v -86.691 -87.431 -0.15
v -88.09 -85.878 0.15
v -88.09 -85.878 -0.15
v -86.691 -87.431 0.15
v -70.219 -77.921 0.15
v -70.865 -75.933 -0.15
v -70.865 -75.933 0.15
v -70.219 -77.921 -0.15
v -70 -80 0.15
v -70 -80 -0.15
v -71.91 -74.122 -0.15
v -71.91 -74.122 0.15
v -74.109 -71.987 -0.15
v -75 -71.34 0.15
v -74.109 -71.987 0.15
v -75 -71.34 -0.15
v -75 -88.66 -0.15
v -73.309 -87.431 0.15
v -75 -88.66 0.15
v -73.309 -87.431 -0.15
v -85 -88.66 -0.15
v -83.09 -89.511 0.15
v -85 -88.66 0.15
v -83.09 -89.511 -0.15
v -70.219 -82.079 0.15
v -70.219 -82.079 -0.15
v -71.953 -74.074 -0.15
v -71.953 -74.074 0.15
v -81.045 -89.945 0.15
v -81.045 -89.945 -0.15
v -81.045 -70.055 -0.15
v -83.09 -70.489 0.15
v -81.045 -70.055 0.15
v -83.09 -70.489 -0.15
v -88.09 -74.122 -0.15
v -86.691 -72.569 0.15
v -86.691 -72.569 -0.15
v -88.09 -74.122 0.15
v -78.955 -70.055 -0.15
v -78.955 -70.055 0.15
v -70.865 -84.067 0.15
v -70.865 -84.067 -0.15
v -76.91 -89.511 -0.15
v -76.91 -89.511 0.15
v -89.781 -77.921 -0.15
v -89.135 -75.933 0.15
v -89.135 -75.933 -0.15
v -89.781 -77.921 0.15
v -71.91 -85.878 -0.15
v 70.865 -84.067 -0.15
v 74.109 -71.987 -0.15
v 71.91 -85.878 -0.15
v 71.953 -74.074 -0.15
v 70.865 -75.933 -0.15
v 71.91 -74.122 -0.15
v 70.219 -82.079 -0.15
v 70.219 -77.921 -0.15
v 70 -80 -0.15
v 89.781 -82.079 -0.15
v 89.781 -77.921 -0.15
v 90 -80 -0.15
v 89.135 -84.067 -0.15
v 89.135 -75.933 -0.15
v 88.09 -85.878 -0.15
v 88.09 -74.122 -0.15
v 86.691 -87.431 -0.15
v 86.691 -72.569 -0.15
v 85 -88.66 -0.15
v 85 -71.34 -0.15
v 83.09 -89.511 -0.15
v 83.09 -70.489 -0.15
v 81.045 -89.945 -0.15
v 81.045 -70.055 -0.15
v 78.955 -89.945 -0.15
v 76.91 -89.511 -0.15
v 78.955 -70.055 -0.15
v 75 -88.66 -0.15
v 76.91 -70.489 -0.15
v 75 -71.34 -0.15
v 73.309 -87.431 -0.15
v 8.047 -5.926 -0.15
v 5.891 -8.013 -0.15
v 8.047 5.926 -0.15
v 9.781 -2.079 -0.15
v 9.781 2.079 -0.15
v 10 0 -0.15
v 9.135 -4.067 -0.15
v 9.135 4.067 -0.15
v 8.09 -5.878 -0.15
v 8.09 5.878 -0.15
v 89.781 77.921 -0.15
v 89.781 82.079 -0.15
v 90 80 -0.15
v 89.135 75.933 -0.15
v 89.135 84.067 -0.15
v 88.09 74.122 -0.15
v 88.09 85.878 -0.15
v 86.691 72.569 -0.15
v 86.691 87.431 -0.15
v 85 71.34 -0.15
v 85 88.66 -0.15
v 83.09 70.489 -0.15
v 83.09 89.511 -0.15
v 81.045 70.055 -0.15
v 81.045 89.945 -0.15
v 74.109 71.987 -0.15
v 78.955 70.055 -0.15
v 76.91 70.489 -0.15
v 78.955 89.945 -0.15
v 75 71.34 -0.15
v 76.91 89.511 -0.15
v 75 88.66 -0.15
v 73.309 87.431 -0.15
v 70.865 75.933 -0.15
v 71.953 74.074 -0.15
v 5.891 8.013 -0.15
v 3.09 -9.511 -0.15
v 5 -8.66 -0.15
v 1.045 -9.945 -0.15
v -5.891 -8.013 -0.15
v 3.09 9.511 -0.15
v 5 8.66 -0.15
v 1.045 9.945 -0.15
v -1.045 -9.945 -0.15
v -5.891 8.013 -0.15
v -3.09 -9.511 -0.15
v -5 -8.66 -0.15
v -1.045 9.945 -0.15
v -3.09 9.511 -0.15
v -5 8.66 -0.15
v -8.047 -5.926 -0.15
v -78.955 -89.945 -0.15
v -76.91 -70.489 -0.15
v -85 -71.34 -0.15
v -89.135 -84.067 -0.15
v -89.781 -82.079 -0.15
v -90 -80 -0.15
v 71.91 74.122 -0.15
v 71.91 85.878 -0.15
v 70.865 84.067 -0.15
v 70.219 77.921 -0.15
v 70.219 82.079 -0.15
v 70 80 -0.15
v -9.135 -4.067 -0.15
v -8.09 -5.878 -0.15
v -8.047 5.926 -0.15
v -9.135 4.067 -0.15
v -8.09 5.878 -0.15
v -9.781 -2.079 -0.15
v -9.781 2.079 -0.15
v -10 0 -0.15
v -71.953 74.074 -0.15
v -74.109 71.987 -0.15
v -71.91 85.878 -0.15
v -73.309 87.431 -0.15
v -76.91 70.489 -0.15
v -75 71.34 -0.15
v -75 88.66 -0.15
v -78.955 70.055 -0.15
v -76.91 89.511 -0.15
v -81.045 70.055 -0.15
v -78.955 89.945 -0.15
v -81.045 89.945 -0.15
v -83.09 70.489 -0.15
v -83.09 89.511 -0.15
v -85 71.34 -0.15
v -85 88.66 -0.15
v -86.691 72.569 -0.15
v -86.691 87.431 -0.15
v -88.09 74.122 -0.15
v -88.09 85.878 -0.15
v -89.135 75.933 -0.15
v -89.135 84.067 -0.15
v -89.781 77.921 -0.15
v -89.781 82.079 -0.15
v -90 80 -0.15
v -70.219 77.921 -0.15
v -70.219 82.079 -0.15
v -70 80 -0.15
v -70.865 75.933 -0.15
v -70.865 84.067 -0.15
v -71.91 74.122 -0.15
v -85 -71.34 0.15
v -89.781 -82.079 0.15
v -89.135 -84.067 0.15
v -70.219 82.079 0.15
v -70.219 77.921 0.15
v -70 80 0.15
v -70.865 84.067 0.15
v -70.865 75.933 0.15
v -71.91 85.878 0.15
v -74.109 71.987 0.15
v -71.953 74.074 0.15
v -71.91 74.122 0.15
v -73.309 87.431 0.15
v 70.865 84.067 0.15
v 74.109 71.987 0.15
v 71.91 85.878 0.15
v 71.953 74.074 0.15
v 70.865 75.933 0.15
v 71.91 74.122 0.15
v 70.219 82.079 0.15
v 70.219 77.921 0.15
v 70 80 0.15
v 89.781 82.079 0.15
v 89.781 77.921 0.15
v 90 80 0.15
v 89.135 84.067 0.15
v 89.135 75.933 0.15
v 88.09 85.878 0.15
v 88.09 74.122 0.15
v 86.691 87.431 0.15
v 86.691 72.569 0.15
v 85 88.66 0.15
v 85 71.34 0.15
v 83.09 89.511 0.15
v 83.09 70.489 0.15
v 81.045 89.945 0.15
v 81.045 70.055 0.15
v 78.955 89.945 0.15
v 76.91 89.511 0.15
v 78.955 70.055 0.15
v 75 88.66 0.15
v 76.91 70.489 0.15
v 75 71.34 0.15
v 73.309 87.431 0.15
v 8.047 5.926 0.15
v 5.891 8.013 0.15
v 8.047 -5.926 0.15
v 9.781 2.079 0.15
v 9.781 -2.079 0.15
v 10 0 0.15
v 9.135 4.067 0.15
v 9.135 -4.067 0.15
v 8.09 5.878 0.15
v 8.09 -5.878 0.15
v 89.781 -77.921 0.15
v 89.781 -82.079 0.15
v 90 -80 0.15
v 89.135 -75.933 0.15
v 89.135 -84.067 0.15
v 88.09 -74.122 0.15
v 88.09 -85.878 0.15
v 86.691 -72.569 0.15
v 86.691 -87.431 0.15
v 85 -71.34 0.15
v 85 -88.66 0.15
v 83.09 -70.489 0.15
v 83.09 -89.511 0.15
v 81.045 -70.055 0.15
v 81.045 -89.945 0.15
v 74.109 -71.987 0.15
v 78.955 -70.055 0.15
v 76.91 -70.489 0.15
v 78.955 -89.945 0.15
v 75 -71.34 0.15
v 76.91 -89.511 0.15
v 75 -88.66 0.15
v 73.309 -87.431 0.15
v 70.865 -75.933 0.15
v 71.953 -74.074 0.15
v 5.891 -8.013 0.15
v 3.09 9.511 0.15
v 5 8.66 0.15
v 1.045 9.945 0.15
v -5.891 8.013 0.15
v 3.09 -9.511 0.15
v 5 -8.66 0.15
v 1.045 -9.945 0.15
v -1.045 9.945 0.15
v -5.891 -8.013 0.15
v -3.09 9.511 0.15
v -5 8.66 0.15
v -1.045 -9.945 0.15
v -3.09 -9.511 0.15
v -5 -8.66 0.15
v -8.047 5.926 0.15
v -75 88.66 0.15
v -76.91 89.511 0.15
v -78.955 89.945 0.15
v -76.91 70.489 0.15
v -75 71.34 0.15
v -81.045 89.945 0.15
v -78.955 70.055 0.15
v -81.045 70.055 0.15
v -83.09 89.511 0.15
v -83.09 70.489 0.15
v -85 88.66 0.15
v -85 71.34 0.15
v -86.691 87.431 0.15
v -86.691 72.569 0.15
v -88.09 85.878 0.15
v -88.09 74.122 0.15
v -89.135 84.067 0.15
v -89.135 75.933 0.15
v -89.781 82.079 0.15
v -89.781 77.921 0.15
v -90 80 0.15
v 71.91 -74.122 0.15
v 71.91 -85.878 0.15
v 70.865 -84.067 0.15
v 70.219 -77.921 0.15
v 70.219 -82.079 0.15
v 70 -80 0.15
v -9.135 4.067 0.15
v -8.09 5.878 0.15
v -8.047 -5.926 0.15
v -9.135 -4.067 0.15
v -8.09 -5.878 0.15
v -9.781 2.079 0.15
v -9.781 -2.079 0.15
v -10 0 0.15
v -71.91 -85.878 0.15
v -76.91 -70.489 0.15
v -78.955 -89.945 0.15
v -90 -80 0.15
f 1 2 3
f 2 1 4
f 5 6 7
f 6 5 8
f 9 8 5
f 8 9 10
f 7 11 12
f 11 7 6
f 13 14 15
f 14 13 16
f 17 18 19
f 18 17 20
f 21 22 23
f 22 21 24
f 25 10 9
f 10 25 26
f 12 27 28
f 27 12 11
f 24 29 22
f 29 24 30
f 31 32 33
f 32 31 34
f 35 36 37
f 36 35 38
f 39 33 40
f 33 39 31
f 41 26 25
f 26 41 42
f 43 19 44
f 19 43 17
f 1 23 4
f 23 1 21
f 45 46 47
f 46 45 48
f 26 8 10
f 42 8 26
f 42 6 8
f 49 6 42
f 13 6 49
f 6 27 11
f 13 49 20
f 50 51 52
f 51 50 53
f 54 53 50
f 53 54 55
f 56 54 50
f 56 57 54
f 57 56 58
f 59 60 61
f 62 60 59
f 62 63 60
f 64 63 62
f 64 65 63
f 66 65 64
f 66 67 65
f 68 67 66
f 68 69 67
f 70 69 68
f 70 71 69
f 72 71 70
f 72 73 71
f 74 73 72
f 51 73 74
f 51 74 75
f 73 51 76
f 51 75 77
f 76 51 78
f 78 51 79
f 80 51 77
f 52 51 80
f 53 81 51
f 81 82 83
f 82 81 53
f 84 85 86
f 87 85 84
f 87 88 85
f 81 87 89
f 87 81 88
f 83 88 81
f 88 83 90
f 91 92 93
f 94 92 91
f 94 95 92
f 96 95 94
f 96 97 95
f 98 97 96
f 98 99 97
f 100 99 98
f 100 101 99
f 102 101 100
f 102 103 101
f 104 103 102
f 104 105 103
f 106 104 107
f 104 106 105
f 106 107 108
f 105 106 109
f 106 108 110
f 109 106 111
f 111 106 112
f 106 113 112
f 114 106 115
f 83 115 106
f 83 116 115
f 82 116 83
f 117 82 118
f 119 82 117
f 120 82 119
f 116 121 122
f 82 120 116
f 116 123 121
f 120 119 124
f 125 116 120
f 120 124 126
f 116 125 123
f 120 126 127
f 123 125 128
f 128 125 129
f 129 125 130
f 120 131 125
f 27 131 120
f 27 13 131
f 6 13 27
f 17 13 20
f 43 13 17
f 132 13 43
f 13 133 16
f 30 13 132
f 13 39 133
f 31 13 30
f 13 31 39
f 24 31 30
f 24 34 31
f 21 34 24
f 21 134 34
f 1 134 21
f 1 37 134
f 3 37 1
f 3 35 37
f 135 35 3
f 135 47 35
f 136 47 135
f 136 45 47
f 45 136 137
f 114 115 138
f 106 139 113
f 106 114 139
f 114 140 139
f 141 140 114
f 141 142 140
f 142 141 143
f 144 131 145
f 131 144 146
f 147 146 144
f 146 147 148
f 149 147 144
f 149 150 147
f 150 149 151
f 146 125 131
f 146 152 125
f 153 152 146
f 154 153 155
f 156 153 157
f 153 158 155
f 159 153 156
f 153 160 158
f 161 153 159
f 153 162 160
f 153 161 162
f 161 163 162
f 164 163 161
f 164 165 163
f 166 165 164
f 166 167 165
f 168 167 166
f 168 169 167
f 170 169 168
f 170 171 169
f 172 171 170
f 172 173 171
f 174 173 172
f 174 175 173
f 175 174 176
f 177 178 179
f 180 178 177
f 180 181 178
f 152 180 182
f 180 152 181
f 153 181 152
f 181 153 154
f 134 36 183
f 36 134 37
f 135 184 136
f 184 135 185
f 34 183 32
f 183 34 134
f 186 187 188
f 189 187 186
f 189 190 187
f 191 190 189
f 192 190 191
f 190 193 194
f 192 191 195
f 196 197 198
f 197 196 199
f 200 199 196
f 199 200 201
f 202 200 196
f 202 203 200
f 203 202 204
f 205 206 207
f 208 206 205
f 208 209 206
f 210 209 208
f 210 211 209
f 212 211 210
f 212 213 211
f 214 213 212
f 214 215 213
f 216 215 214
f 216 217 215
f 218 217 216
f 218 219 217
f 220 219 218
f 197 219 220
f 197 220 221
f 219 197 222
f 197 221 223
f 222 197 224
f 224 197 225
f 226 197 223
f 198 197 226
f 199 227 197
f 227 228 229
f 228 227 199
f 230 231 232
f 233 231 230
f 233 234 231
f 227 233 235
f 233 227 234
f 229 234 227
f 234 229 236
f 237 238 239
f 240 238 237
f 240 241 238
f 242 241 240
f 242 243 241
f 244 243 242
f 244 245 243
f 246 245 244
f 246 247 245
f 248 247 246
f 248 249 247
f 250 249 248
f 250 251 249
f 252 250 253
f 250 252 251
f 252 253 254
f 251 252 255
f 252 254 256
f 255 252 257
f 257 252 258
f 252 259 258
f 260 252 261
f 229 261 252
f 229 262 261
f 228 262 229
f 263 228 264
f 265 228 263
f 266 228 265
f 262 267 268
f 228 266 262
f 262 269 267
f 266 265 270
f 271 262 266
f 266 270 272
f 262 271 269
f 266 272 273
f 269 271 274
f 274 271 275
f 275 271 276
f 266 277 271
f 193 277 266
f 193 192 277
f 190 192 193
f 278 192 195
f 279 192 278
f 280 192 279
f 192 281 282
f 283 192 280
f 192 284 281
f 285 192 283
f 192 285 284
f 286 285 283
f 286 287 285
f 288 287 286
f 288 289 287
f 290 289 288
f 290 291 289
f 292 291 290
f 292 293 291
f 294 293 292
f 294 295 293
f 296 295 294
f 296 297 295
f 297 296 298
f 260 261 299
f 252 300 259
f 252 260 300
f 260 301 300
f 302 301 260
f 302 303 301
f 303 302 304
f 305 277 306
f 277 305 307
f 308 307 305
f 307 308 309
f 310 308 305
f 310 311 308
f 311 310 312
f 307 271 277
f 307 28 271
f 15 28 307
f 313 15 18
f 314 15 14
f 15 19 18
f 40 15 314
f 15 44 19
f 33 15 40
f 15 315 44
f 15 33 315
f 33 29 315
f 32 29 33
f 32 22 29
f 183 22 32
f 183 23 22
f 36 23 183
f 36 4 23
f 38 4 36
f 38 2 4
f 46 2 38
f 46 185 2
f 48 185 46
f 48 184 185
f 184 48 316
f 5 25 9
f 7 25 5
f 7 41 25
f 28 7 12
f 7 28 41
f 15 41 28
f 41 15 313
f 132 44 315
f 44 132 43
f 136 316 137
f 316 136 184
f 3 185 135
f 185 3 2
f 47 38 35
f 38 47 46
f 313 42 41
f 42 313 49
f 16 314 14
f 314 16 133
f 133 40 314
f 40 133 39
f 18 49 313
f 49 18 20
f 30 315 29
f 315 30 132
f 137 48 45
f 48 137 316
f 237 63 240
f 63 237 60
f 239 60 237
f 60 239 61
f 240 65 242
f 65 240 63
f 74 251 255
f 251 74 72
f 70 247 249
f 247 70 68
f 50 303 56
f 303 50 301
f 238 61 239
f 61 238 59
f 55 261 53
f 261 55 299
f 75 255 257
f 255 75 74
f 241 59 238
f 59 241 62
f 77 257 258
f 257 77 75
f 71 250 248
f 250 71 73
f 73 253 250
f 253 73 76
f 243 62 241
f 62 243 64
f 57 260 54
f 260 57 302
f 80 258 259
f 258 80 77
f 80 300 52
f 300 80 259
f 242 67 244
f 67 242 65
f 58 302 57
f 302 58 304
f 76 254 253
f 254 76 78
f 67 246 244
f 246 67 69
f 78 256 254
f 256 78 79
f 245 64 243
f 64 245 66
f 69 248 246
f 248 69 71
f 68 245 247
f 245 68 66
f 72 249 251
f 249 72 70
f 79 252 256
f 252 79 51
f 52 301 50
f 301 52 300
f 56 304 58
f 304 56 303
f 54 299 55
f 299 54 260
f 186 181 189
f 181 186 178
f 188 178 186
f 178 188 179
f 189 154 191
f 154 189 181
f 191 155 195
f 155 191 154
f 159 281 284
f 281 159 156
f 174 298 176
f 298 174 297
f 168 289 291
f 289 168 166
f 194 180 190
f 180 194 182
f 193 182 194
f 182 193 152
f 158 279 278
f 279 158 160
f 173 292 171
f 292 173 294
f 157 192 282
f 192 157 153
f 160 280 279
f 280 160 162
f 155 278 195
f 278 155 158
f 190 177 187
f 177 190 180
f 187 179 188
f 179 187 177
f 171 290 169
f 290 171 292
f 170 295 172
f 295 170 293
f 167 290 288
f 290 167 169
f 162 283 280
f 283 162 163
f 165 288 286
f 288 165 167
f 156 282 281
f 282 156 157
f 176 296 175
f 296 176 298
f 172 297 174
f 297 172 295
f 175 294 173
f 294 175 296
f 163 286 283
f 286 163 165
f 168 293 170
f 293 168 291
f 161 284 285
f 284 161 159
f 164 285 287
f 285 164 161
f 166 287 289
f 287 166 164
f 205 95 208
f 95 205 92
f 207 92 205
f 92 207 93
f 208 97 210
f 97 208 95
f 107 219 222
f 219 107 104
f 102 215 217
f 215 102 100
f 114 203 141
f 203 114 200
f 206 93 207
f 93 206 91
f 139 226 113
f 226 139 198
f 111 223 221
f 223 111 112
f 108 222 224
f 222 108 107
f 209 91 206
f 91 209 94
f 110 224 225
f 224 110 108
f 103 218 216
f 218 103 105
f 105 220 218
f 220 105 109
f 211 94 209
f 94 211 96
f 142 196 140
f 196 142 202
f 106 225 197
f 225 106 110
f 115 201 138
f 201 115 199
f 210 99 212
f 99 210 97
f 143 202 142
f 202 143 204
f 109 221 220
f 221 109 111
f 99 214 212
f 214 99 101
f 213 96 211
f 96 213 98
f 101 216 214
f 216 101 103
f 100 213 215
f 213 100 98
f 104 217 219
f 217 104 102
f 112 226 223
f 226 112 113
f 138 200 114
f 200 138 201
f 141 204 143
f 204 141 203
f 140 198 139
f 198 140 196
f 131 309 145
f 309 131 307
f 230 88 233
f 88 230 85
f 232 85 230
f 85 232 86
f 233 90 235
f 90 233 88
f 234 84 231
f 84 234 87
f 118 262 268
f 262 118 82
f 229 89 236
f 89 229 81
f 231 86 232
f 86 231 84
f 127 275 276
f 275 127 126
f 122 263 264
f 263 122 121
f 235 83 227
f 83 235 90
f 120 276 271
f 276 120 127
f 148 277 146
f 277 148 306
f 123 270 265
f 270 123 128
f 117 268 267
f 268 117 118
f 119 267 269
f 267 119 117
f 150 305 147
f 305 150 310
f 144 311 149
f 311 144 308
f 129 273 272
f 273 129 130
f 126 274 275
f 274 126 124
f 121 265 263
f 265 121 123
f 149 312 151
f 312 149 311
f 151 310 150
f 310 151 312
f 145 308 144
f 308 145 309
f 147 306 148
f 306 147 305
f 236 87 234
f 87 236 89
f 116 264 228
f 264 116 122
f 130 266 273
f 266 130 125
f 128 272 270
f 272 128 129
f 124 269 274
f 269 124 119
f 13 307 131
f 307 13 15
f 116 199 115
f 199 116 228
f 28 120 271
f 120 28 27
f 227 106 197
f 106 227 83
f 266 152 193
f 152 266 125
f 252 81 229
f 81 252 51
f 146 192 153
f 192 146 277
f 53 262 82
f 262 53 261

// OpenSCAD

/* [Size] */
size = 180; //[1:500]

circle_diameter = 20; //[1:50]

module fivePoint1stLayerPrintTest()
{
    rsize = circle_diameter/2;
    xpos= size/2 - rsize;
    ypos = size/2 - rsize;
    
    union() {
translate([-xpos,-ypos,0]){
      cylinder(r=rsize, h=0.3, center = true);
}
translate([xpos,-ypos,0]){
      cylinder(r=rsize, h=0.3, center = true);
}
translate([-xpos,ypos,0]){
      cylinder(r=rsize, h=0.3, center = true);
}
translate([xpos,ypos,0]){
      cylinder(r=rsize, h=0.3, center = true);
}
cylinder(r=rsize, h=0.3, center = true);

rotate([0,0,45])
      cube([(xpos+ypos)*1.4, 3, 0.3], center = true);
rotate([0,0,-45])
      cube([(xpos+ypos)*1.4, 3, 0.3], center = true);

    }
    
}

fivePoint1stLayerPrintTest();
